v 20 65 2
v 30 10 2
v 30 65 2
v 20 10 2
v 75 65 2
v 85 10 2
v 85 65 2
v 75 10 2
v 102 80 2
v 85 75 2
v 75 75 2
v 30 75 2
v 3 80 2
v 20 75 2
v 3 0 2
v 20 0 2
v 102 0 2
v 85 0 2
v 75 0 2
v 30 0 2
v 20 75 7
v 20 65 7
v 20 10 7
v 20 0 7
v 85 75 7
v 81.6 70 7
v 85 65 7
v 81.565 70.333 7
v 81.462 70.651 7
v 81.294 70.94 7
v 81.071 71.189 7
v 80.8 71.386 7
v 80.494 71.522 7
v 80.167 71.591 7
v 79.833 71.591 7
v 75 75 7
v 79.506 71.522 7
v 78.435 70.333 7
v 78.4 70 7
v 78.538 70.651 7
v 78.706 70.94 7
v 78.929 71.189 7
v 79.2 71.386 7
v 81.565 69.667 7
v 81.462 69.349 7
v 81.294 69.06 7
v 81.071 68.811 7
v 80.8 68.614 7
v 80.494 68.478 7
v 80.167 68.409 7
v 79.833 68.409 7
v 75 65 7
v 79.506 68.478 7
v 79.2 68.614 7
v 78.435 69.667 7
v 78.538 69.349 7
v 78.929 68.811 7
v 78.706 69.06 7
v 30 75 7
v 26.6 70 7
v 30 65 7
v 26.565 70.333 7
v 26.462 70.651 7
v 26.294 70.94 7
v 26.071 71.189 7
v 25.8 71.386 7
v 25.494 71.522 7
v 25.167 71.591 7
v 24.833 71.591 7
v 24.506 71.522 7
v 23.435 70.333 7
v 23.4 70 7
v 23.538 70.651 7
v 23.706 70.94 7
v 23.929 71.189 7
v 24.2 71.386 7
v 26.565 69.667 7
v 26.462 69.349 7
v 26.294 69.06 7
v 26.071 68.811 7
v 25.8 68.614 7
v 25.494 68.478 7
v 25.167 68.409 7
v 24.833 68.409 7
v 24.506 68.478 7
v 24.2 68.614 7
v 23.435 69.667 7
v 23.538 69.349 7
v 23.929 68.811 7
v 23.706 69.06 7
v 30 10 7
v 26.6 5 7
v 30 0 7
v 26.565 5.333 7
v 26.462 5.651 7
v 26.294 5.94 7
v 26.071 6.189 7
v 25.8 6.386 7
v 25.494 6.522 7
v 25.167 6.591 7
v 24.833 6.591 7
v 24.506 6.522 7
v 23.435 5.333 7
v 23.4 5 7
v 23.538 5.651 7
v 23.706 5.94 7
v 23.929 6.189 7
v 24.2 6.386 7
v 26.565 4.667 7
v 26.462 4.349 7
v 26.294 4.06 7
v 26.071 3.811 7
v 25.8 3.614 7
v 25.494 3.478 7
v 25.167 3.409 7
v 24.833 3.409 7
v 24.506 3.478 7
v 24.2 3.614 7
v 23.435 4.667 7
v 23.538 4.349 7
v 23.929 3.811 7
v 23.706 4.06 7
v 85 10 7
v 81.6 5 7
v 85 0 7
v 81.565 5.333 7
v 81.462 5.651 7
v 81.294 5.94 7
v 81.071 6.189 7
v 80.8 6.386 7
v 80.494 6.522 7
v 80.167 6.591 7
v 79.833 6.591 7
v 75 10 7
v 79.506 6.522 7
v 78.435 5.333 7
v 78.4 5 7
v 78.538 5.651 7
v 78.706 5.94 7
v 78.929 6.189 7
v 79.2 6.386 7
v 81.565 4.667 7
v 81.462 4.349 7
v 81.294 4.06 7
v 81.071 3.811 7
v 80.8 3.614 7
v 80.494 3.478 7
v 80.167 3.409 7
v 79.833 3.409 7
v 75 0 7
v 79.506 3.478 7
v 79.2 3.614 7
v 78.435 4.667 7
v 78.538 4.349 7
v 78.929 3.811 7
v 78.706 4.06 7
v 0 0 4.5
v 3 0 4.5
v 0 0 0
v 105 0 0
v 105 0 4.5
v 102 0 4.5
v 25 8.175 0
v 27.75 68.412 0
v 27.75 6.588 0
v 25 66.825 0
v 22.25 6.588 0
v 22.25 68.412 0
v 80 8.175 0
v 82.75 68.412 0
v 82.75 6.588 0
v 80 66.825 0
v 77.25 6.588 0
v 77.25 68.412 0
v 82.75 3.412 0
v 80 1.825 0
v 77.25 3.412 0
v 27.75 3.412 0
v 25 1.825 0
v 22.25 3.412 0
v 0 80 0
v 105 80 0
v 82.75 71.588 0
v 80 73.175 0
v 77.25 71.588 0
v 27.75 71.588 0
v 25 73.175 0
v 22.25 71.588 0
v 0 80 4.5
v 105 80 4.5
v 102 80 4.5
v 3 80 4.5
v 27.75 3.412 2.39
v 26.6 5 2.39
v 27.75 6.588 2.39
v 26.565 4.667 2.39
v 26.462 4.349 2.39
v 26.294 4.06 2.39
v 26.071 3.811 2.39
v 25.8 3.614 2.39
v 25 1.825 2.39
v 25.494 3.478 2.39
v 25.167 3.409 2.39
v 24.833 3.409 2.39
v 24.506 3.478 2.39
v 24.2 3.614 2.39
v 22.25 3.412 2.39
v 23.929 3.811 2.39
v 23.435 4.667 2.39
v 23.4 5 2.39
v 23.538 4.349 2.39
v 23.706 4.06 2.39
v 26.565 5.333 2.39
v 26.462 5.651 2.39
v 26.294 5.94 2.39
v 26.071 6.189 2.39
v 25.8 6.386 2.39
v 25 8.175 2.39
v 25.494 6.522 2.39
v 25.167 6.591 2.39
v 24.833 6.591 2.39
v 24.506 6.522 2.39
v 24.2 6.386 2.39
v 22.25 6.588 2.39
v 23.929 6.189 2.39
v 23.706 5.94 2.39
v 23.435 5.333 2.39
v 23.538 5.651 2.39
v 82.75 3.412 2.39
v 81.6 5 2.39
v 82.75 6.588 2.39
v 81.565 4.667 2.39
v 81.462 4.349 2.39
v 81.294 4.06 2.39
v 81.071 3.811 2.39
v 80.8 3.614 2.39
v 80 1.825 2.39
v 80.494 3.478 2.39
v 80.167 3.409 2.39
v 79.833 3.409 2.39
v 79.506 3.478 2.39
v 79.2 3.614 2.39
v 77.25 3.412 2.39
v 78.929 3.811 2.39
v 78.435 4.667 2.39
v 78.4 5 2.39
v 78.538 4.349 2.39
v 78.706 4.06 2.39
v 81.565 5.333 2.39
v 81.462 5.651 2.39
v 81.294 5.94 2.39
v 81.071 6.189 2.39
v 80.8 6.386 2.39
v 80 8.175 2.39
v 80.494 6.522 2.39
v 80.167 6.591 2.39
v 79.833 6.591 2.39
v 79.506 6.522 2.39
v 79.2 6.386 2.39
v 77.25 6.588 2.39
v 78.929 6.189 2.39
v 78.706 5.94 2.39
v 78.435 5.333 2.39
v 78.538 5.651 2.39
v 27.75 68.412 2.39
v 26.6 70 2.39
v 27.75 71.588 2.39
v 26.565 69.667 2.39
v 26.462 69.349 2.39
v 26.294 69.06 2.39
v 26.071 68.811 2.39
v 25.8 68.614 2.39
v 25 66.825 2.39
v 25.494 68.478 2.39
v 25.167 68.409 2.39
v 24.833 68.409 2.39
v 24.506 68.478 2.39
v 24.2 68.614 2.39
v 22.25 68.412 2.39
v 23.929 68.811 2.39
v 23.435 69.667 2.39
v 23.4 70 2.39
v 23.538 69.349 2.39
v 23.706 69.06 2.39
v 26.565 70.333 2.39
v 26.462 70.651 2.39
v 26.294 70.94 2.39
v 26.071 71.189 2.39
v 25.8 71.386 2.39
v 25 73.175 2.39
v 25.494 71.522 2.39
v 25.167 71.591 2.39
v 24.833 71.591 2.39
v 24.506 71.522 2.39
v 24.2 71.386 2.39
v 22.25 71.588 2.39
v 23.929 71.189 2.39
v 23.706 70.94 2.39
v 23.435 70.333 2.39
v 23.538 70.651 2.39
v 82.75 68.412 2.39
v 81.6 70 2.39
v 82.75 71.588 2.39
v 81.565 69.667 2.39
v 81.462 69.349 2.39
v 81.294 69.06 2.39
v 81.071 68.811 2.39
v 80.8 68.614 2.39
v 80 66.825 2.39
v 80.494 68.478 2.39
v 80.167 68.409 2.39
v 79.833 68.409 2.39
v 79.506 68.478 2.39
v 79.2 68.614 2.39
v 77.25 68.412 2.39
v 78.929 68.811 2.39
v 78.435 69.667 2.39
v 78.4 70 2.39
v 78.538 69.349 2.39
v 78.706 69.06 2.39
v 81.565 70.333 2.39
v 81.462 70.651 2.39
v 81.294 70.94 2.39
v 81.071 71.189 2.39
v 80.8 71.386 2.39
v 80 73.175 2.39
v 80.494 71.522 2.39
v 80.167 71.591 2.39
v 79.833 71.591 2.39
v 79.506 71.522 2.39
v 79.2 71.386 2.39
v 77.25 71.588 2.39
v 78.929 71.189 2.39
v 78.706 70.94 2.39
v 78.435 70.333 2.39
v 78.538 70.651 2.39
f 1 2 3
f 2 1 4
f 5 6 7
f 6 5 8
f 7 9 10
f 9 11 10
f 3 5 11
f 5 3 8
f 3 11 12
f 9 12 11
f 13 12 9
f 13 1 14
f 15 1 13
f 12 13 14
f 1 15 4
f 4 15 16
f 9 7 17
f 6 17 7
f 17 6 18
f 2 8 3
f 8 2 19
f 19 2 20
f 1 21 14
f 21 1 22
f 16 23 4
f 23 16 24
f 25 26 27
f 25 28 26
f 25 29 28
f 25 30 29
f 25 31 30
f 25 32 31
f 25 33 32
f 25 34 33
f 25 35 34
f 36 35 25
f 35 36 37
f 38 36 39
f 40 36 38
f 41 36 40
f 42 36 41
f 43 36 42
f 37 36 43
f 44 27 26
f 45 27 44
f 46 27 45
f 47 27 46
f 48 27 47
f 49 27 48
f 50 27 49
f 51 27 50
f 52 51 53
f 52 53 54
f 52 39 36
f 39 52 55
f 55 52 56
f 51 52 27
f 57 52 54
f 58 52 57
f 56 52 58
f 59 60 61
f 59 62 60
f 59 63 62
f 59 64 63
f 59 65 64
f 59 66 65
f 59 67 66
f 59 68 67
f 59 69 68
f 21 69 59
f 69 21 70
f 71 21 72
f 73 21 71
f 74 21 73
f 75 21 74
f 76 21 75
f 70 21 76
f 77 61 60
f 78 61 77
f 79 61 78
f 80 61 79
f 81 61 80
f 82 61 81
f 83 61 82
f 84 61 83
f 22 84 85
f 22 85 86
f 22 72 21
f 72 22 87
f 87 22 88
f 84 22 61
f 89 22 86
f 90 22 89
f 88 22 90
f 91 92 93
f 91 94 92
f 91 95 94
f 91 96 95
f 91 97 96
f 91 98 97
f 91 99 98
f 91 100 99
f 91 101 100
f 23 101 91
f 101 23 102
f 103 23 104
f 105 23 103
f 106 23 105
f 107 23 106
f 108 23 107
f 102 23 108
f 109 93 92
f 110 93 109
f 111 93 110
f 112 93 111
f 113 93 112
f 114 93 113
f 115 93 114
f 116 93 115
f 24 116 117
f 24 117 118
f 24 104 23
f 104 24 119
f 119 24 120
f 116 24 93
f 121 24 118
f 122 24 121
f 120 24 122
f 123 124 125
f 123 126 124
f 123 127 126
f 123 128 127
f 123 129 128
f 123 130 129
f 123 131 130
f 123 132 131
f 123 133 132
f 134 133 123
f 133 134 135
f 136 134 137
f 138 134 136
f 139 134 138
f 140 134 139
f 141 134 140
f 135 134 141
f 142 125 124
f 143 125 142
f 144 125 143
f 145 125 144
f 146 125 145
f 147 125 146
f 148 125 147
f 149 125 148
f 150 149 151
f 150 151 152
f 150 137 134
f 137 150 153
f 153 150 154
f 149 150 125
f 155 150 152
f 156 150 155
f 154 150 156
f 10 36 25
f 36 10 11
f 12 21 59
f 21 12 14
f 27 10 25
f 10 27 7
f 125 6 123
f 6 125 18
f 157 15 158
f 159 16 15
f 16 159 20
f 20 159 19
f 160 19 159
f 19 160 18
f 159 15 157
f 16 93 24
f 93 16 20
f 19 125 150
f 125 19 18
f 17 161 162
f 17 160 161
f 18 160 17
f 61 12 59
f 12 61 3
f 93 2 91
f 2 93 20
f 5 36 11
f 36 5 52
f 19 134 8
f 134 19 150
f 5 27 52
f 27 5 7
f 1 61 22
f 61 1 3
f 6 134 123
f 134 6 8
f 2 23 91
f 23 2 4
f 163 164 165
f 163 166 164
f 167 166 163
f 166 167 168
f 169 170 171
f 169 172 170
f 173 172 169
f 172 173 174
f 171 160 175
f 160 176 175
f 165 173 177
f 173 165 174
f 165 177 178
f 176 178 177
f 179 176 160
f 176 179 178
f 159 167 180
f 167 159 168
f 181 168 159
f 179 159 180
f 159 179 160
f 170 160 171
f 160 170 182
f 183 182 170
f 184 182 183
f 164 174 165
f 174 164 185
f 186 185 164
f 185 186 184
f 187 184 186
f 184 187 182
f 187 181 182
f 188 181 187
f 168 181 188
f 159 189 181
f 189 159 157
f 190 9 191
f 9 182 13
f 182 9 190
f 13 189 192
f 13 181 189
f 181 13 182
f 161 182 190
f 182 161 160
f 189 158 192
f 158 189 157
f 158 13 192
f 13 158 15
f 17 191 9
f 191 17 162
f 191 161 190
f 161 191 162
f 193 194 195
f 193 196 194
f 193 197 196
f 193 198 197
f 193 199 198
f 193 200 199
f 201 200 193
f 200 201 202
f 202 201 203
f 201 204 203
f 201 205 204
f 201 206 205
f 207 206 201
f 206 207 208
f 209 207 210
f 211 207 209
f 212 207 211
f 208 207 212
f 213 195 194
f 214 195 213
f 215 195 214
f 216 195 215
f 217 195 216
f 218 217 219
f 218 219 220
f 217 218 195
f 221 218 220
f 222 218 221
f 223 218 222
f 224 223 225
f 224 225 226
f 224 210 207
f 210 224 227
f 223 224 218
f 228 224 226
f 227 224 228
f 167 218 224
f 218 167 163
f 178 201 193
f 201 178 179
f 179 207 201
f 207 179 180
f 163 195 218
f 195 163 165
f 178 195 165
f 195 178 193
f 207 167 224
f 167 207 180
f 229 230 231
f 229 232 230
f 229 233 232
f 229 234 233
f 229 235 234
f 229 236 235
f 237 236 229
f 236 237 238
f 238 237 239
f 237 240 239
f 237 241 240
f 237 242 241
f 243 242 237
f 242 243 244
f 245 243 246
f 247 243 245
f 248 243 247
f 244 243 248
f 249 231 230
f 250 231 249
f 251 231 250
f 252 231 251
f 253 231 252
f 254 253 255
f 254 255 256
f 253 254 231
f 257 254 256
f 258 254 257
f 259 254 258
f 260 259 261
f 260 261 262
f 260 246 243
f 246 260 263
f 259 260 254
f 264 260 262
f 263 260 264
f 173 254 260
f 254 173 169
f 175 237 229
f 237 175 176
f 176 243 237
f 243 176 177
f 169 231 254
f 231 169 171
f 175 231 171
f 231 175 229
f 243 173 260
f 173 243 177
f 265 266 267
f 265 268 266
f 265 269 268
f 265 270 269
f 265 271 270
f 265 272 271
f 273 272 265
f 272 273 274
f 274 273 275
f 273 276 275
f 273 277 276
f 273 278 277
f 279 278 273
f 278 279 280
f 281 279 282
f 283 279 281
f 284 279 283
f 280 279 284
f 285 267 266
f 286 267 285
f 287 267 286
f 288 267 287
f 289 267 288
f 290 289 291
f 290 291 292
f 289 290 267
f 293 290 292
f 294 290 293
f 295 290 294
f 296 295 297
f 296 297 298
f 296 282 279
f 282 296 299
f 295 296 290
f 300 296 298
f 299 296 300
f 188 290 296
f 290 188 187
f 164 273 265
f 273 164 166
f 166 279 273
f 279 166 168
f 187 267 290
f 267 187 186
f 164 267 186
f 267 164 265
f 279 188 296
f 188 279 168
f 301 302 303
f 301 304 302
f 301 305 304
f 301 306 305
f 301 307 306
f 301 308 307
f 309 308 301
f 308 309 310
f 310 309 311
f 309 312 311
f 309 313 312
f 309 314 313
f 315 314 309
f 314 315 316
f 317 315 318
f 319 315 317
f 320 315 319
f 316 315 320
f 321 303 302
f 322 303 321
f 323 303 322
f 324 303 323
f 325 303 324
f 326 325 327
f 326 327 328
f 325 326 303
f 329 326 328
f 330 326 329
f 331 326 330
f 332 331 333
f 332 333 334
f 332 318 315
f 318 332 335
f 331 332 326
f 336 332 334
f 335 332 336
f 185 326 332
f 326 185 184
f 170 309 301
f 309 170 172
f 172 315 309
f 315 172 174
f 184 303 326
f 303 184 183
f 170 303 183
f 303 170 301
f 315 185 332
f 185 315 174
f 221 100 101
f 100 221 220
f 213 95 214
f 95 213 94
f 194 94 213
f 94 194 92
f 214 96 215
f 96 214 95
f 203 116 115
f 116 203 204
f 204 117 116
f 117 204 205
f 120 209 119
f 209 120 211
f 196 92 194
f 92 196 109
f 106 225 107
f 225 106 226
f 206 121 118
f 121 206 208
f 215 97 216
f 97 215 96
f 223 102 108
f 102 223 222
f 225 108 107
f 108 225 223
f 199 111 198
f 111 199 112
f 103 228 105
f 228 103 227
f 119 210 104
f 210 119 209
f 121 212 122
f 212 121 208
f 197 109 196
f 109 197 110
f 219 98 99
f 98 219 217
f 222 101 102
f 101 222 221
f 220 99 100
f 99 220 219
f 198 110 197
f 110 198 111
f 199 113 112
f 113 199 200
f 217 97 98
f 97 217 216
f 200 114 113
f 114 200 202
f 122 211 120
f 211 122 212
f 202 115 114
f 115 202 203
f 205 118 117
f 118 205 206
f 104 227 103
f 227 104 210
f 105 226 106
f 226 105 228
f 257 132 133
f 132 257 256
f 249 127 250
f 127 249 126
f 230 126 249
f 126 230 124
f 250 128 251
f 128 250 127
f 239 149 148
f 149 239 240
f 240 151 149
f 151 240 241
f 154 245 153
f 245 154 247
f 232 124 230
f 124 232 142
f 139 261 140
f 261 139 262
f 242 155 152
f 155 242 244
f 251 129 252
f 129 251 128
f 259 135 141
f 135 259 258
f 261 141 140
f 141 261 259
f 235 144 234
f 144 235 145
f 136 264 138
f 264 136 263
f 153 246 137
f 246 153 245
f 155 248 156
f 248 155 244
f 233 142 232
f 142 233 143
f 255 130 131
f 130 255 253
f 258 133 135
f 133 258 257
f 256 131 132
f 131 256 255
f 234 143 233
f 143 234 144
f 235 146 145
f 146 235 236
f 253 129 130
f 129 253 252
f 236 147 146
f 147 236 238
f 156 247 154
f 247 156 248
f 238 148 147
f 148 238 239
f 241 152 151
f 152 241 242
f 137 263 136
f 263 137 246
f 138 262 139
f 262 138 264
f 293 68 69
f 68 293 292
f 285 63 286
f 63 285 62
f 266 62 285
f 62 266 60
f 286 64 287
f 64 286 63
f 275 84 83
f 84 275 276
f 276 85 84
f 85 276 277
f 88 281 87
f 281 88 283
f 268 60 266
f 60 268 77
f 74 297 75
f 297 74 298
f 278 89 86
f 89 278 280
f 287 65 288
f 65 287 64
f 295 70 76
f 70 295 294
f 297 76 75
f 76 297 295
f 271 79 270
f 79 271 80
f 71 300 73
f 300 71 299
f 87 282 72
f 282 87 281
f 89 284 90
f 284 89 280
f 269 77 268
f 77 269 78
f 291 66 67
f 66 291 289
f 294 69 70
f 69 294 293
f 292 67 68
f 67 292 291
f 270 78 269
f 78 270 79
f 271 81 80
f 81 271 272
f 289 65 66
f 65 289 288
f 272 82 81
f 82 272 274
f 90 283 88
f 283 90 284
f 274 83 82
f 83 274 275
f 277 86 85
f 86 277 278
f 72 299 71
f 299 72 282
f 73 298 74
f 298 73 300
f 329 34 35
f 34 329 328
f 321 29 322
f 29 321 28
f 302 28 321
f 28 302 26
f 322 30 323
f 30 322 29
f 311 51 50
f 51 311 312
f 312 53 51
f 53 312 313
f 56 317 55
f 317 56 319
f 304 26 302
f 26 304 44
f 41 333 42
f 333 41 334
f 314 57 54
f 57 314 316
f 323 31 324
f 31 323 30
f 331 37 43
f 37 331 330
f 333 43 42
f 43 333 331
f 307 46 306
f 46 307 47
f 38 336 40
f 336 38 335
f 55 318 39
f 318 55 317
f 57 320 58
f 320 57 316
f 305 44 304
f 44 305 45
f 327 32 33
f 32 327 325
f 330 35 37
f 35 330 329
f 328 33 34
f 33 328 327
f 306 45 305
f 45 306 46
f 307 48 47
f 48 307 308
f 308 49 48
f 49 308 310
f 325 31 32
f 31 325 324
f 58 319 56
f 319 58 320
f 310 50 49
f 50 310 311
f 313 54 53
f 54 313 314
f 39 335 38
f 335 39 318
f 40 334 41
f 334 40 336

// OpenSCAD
include <bolts/BOLTS.scad>

$fn=30;

difference() {

    union() {
        linear_extrude(height=2.0)
            square([105,80]);
        translate([0, 0, 2])        
        linear_extrude(height=2.5)
            square([3, 80]);
        translate([102, 0, 2])        
        linear_extrude(height=2.5)
            square([3, 80]);
       
       
        translate([20, 0, 2.0]) {
            difference() {
                translate([0, 0, 00]) 
                linear_extrude(height=5)
                square([65,75]);
                translate([10, -0, 00]) 
                linear_extrude(height=5)
                square([45,75]);
                translate([0, 10, 00]) 
                linear_extrude(height=5)
                square([65,55]);
            }
        }
    }

    translate([20, 0, 0]) {
        translate([5, 5, 0])
        cylinder(10, d=3.2);
        translate([60, 5, 0])
        cylinder(10, d=3.2);
        translate([5, 70, 0])
        cylinder(10, d=3.2);
        translate([60, 70, 0])
        cylinder(10, d=3.2);
        translate([5, 5, -0.01]) ISO4032("M3",part_mode="diff");    
        translate([60, 5, -0.01]) ISO4032("M3",part_mode="diff");    
        translate([5, 70, -0.01]) ISO4032("M3",part_mode="diff");    
        translate([60, 70, -0.01]) ISO4032("M3",part_mode="diff");    
      
    }

}
